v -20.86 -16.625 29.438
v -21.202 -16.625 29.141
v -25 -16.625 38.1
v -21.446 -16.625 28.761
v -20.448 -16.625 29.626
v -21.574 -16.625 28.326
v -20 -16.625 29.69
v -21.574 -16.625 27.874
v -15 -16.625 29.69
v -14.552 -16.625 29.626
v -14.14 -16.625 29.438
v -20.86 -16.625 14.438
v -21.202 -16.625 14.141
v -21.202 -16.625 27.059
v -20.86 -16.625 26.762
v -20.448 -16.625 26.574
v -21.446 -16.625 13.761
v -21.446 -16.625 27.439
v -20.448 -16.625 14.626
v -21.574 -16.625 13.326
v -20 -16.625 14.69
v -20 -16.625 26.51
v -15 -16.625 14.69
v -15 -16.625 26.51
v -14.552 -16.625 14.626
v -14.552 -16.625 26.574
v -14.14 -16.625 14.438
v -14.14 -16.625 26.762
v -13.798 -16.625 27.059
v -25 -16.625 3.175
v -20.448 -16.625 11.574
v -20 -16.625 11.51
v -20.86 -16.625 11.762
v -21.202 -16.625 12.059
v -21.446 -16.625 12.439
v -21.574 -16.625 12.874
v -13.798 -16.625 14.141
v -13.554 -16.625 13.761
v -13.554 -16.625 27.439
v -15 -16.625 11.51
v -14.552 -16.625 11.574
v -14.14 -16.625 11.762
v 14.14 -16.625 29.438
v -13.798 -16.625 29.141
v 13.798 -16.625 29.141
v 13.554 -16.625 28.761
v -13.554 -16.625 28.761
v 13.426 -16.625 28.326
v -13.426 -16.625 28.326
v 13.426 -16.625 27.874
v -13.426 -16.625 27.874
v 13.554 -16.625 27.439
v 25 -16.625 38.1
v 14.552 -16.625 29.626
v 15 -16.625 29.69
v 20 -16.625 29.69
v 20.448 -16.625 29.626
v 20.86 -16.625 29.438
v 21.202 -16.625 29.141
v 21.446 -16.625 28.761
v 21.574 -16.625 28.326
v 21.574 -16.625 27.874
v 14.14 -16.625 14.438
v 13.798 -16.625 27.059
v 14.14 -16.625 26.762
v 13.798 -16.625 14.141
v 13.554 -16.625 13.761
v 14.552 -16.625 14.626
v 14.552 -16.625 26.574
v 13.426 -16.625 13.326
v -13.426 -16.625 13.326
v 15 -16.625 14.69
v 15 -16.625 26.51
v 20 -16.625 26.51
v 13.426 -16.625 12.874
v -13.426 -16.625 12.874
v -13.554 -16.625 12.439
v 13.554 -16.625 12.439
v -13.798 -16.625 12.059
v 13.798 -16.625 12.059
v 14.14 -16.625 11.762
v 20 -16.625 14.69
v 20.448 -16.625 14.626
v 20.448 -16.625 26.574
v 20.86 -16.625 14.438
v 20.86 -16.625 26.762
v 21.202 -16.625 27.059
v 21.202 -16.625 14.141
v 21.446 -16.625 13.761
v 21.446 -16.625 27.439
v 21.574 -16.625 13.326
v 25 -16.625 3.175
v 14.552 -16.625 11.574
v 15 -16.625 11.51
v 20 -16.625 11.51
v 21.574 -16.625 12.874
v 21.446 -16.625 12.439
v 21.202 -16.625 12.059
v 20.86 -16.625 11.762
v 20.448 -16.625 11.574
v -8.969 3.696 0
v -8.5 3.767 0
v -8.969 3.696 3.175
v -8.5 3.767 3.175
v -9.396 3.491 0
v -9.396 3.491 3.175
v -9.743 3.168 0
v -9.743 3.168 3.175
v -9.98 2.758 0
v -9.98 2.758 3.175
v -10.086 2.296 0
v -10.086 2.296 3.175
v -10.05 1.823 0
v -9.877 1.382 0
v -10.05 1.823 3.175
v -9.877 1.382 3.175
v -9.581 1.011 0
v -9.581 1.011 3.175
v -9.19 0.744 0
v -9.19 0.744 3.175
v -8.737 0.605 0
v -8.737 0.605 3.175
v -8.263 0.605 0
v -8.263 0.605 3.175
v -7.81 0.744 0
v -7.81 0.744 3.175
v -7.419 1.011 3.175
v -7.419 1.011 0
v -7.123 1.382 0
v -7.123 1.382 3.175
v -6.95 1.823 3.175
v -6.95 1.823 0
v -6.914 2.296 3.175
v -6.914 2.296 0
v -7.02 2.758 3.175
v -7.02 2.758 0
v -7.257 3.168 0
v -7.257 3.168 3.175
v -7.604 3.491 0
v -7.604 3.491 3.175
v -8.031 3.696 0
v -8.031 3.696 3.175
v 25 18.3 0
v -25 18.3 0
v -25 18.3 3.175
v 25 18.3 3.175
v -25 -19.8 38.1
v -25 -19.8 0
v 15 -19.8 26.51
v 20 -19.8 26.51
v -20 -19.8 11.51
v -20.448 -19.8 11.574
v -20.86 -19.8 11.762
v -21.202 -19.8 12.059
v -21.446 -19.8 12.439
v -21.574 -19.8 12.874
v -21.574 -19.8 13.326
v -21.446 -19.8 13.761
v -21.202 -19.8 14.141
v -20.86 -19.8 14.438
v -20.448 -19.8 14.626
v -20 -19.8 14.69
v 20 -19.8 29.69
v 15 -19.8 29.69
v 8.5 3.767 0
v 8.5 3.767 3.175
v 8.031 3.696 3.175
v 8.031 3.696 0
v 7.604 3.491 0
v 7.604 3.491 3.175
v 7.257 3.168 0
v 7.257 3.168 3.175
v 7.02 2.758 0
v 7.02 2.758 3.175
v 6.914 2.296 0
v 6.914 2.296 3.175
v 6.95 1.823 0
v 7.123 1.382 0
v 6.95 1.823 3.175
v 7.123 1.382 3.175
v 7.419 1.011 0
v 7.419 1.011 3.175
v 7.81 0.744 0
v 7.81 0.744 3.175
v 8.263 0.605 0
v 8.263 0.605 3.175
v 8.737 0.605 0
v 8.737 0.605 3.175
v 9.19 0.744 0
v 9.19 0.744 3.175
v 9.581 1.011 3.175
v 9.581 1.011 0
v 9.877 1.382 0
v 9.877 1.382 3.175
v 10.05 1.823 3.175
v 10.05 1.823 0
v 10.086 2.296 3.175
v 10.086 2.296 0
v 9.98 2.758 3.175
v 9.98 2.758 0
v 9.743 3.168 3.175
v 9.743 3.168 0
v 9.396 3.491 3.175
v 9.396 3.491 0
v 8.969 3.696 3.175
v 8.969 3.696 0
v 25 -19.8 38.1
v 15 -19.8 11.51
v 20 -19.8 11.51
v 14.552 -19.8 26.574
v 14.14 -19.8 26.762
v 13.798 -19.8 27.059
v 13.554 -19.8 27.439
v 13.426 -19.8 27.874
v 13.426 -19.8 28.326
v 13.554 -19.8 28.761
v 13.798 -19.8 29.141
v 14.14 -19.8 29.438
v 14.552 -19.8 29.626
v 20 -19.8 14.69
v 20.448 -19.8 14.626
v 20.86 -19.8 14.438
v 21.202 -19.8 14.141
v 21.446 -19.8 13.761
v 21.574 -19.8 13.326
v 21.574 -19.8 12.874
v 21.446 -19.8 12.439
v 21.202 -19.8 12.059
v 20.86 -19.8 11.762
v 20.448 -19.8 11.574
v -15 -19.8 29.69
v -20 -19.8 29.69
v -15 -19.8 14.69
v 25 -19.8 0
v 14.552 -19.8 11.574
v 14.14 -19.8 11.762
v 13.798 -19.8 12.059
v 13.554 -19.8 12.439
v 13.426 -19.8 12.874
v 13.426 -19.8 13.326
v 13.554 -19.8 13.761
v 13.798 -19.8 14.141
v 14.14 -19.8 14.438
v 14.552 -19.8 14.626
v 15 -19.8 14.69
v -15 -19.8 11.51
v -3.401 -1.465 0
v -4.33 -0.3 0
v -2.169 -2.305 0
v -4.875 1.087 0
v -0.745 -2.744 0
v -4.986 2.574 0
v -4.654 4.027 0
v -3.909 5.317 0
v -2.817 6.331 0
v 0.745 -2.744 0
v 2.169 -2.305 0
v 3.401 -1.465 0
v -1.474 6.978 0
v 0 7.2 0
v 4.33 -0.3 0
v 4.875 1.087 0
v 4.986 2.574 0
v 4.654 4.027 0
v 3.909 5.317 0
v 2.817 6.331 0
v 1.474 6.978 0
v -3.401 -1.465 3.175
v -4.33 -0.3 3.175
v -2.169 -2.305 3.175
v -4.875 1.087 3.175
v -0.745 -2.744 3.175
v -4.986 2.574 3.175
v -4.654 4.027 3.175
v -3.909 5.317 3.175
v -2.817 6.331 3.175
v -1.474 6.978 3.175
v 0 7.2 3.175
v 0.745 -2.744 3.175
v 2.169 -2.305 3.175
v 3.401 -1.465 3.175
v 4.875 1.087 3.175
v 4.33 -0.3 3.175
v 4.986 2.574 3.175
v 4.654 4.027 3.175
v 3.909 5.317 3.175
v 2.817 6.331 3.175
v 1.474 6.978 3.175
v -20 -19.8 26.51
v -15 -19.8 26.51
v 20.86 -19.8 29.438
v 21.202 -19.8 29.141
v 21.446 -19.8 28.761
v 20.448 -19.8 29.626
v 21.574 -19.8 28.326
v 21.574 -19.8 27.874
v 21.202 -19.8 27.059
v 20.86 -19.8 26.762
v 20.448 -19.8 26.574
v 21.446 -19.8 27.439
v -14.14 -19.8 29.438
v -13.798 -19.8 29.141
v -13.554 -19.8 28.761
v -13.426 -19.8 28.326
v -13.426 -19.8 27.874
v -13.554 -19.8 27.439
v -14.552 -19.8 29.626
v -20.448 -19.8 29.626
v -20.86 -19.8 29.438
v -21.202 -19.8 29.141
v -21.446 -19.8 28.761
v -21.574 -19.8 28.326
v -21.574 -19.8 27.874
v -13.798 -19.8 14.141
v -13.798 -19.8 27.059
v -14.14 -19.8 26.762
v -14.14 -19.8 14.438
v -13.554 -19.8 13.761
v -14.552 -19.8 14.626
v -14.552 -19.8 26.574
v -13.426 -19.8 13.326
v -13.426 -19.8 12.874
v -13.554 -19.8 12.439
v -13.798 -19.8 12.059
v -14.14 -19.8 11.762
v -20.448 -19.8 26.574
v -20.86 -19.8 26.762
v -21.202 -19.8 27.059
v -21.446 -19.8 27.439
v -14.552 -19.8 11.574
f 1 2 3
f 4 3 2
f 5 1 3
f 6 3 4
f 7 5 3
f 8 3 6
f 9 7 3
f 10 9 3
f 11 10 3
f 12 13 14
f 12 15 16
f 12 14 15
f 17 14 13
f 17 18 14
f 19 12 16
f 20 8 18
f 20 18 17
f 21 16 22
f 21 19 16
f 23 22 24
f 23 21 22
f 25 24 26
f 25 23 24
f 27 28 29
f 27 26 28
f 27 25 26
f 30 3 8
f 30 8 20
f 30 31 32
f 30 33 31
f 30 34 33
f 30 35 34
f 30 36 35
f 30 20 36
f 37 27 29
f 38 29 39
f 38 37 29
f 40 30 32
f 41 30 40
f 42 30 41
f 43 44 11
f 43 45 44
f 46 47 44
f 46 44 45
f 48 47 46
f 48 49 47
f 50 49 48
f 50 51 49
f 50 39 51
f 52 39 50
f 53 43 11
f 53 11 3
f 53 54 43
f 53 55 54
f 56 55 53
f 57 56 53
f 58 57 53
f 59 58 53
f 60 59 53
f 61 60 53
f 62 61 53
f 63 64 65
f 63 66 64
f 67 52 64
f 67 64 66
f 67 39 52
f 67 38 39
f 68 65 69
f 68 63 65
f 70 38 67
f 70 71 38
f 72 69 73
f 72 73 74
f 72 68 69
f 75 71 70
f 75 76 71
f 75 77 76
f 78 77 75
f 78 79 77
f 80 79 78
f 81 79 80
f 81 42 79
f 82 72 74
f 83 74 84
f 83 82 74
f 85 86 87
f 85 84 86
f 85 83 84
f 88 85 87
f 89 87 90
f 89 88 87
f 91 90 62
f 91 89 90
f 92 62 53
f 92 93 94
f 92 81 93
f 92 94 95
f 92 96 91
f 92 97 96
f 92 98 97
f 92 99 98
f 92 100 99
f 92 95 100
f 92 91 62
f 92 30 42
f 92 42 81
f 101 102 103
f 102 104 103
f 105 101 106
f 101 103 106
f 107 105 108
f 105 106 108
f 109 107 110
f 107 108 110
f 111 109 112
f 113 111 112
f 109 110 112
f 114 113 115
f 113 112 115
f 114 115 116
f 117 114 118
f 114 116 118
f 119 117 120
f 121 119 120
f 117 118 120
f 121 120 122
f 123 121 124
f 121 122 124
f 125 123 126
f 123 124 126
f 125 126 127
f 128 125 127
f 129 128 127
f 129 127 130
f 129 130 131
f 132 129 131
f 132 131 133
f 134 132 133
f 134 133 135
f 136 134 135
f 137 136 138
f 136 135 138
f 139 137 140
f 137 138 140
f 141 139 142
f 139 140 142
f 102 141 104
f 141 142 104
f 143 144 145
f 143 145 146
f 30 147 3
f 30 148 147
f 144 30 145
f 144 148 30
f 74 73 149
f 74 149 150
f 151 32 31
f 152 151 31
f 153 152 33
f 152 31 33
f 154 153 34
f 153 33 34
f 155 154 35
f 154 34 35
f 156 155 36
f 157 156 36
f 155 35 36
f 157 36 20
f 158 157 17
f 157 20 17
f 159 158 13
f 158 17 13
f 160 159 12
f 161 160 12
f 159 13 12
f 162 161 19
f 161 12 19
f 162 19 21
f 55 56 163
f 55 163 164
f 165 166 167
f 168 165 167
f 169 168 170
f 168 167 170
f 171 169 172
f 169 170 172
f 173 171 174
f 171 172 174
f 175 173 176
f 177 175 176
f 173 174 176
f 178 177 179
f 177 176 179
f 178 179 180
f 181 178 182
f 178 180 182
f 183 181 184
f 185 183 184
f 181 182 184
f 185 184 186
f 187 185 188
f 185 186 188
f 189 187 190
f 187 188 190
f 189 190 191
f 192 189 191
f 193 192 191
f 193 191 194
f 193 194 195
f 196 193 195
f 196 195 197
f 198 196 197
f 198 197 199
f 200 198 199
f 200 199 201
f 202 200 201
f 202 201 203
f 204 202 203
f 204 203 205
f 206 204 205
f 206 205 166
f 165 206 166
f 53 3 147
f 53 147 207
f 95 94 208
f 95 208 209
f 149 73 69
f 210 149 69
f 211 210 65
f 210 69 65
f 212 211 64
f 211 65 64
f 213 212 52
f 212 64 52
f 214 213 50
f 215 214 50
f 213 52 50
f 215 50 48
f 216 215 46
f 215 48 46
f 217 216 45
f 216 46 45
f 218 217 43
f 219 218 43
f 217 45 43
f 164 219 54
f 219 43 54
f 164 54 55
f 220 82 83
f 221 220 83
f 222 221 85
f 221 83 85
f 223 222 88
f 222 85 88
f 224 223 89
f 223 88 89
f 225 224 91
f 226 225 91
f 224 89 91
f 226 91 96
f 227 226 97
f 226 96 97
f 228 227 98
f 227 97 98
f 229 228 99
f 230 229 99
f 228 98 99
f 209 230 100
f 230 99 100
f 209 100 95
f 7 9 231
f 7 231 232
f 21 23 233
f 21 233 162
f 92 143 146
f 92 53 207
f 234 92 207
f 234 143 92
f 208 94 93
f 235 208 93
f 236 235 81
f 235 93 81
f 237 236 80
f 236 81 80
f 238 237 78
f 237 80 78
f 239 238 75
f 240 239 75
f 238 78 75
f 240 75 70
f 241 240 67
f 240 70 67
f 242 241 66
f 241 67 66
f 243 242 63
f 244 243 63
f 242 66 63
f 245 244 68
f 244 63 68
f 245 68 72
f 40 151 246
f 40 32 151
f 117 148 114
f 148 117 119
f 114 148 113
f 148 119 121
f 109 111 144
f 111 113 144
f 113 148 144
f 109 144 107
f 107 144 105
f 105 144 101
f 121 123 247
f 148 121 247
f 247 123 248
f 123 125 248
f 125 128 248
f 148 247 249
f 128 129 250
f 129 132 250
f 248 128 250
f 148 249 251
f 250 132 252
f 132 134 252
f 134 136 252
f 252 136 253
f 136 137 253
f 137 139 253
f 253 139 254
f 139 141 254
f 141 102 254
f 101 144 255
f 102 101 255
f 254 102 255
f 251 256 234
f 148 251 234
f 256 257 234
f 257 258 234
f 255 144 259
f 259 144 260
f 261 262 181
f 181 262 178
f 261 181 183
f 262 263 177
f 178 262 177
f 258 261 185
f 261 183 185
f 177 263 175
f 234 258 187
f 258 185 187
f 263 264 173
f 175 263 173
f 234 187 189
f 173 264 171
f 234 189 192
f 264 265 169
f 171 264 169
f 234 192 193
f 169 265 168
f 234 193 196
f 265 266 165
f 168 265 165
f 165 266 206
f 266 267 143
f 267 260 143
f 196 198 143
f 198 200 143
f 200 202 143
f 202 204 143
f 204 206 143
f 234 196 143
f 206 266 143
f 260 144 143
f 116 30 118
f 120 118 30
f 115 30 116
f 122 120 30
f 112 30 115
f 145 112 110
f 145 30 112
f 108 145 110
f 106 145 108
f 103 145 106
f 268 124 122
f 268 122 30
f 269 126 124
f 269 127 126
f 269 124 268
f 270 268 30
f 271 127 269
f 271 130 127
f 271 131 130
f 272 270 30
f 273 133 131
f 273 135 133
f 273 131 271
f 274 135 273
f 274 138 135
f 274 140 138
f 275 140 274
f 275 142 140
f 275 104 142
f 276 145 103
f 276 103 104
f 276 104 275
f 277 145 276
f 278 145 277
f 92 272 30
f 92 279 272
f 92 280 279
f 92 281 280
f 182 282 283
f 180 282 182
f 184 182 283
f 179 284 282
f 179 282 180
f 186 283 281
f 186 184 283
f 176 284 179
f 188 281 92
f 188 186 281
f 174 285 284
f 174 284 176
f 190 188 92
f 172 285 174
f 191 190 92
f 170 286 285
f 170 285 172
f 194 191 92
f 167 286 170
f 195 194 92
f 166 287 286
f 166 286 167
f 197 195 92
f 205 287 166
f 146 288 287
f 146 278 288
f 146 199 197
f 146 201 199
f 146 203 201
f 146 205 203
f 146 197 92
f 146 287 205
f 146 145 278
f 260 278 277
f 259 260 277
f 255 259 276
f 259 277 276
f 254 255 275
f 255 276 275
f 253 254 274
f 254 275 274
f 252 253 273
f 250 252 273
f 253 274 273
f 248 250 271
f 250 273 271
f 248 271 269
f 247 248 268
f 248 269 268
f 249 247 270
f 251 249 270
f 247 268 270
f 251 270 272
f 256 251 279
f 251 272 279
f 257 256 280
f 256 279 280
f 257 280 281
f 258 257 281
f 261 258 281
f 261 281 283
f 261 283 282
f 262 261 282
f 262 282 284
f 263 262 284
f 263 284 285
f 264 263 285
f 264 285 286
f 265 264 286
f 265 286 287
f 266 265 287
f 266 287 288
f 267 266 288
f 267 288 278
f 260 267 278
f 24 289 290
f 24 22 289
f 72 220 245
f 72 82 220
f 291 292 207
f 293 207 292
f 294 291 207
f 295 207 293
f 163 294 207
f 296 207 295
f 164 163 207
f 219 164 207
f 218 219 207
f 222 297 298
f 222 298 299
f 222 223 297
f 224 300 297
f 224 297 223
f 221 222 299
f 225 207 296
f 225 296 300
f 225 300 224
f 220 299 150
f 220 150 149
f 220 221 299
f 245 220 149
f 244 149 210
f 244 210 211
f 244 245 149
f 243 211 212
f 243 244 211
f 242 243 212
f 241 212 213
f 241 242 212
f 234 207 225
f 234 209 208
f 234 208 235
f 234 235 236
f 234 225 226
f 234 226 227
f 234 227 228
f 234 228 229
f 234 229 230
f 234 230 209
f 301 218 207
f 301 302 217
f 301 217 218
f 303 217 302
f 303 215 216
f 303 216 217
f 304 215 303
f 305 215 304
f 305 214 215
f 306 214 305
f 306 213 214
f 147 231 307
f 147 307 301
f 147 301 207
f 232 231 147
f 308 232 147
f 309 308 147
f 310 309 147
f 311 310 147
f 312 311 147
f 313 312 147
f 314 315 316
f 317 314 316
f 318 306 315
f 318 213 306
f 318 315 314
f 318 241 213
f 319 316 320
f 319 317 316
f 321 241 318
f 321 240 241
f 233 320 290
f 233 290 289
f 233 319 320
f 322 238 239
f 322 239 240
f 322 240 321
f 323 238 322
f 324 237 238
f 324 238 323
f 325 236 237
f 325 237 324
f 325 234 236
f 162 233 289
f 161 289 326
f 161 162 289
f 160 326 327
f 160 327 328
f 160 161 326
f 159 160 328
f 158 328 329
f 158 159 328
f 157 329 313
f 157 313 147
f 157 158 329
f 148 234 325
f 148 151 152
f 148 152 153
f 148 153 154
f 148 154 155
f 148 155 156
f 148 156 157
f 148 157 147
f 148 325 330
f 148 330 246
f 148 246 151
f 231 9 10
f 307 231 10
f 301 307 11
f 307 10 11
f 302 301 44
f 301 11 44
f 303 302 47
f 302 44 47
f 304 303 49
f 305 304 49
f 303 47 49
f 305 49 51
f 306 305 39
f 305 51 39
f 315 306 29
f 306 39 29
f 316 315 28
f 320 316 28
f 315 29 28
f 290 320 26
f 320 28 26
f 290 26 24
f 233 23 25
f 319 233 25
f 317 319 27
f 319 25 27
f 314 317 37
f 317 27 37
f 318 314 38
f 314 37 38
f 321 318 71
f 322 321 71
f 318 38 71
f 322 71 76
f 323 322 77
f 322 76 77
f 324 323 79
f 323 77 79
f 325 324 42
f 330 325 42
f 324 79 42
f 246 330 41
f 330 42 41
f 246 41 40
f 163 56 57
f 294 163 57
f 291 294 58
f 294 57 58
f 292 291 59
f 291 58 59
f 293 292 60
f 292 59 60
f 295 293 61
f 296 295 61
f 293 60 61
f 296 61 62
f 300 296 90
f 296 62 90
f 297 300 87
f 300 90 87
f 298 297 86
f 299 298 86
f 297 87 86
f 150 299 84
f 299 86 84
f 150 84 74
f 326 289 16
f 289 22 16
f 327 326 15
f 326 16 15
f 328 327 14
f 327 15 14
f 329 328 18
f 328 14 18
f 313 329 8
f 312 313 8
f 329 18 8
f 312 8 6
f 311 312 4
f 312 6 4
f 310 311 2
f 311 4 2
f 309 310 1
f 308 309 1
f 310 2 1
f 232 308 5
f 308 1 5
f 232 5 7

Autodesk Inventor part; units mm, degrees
ref_plane "YZ Plane" through (0, 0, 0) normal (1, 0, 0) x (0, 1, 0)
ref_plane "XZ Plane" through (0, 0, 0) normal (0, 1, 0) x (-1, 0, 0)
ref_plane "XY Plane" through (0, 0, 0) normal (0, 0, 1) x (1, 0, 0)
sketch "Sketch1" plane through (0, 0, 0) normal (0, 0, 1) x (1, 0, 0)
  line L0 (25, 16.8) -> (25, -19.8)
  line L1 (25, -19.8) -> (-25, -19.8)
  line L2 (-25, -19.8) -> (-25, 16.8)
  line L3 (-25, -19.8) -> (-25, -16.8)
  line L4 (-25, -19.8) -> (-25, 18.3)
  line L5 (-25, 18.3) -> (25, 18.3)
  line L6 (25, 18.3) -> (25, -19.8)
  line L7 (-25, -19.8) -> (-25, -16.625)
  line L8 (-25, -16.625) -> (25, -16.625)
  dimension "d94" = 3.175
extrude "Extrusion3" add sketch "Sketch1" along normal blind 3.175
extrude "Extrusion4" add sketch "Sketch1" along normal blind 38.1 contours L0 L1 L2 L8
sketch "Sketch2" plane through (-25, -16.625, 3) normal (0, 1, 0) x (1, 0, 0)
  line L0 (50, -35.1) -> (0, -35.1) projected
  line L1 (0, 0) -> (50, 0) projected
  line L2 (0, 0) -> (0, -35.1) projected
  line L3 (50, 0) -> (50, -35.1) projected
  line L4 (50, -35.1) -> (45, -35.1)
  line L5 (0, -35.1) -> (0, -25.1)
  line L6 (0, 3) -> (0, -35.1) projected
  line L7 (45, -35.1) -> (45, -25.1)
  line L8 (45, -25.1) -> (5, -25.1)
  line L9 (5, -25.1) -> (5, -10.1)
  line L10 (5, -10.1) -> (45, -10.1)
  line L11 (45, -10.1) -> (45, -25.1)
  point P0 (40, -25.1)
  point P1 (40, -10)
  point P2 (10, -10)
  point P3 (10, -25.1)
  dimension "d83" = 5
  dimension "d84" = 10
  dimension "d85" = 40
  dimension "d86" = 15
sketch "Sketch3" plane through (0, 0, 0) normal (0, 0, -1) x (-1, 0, 0)
  line L0 (25, 18.3) -> (25, -0.75)
  line L1 (-25, -16.8) -> (-25, 18.3) projected
  line L2 (25, 18.3) -> (25, 2.3)
  line L3 (25, 18.3) -> (25, -19.8) projected
  line L4 (0, 2.2) -> (0.1, 2.2)
  point P0 (0, -0.75)
  dimension "d67" = 19.05
  dimension "d68" = 25
  dimension "d95" = 16
  dimension "d98" = 0.1
hole "Hole4" at (0, 2.2, 0) direction (0, 0, 1) diameter 10 end through all
sketch "Sketch4" plane through (0, 0, 0) normal (0, 0, -1) x (-1, 0, 0)
  circle A0 centre (-8.5, 2.2) radius 1.2295 projected
  circle A1 centre (8.5, 2.2) radius 1.2295 projected
  line L0 (-25, 18.3) -> (25, 18.3) projected
  line L1 (25, 18.3) -> (25, 2.3)
  line L2 (25, 18.3) -> (25, -19.8) projected
  line L3 (8.5, 2.2) -> (-8.5, 2.1769)
  point P0 (0, 0)
  point P1 (8.5, 2.1769)
  dimension "d96" = 16
hole "Hole5" at (8.5, 2.1769, 0) at (-8.5, 2.1769, 0) direction (0, 0, 1) diameter 3.18 end through all
sketch "Sketch5" plane through (-25, -16.625, 3.175) normal (0, 1, 0) x (1, 0, 0)
  arc A0 (45, -26.515) -> (45, -23.335) centre (45, -24.925) ccw
  arc A1 (40, -23.335) -> (40, -26.515) centre (40, -24.925) ccw
  line L0 (45, -26.515) -> (40, -26.515)
  line L1 (40, -23.335) -> (45, -23.335)
  arc A2 (45, -11.515) -> (45, -8.335) centre (45, -9.925) ccw
  arc A3 (40, -8.335) -> (40, -11.515) centre (40, -9.925) ccw
  line L2 (45, -11.515) -> (40, -11.515)
  line L3 (40, -8.335) -> (45, -8.335)
  arc A4 (10, -26.515) -> (10, -23.335) centre (10, -24.925) ccw
  arc A5 (5, -23.335) -> (5, -26.515) centre (5, -24.925) ccw
  line L4 (10, -26.515) -> (5, -26.515)
  line L5 (5, -23.335) -> (10, -23.335)
  arc A6 (10, -11.515) -> (10, -8.335) centre (10, -9.925) ccw
  arc A7 (5, -8.335) -> (5, -11.515) centre (5, -9.925) ccw
  line L6 (10, -11.515) -> (5, -11.515)
  line L7 (5, -8.335) -> (10, -8.335)
  point P0 (25, 3.175)
extrude "Extrusion5" cut sketch "Sketch5" against normal blind 10
properties part number "Suportepara o motor em cantorneira"
